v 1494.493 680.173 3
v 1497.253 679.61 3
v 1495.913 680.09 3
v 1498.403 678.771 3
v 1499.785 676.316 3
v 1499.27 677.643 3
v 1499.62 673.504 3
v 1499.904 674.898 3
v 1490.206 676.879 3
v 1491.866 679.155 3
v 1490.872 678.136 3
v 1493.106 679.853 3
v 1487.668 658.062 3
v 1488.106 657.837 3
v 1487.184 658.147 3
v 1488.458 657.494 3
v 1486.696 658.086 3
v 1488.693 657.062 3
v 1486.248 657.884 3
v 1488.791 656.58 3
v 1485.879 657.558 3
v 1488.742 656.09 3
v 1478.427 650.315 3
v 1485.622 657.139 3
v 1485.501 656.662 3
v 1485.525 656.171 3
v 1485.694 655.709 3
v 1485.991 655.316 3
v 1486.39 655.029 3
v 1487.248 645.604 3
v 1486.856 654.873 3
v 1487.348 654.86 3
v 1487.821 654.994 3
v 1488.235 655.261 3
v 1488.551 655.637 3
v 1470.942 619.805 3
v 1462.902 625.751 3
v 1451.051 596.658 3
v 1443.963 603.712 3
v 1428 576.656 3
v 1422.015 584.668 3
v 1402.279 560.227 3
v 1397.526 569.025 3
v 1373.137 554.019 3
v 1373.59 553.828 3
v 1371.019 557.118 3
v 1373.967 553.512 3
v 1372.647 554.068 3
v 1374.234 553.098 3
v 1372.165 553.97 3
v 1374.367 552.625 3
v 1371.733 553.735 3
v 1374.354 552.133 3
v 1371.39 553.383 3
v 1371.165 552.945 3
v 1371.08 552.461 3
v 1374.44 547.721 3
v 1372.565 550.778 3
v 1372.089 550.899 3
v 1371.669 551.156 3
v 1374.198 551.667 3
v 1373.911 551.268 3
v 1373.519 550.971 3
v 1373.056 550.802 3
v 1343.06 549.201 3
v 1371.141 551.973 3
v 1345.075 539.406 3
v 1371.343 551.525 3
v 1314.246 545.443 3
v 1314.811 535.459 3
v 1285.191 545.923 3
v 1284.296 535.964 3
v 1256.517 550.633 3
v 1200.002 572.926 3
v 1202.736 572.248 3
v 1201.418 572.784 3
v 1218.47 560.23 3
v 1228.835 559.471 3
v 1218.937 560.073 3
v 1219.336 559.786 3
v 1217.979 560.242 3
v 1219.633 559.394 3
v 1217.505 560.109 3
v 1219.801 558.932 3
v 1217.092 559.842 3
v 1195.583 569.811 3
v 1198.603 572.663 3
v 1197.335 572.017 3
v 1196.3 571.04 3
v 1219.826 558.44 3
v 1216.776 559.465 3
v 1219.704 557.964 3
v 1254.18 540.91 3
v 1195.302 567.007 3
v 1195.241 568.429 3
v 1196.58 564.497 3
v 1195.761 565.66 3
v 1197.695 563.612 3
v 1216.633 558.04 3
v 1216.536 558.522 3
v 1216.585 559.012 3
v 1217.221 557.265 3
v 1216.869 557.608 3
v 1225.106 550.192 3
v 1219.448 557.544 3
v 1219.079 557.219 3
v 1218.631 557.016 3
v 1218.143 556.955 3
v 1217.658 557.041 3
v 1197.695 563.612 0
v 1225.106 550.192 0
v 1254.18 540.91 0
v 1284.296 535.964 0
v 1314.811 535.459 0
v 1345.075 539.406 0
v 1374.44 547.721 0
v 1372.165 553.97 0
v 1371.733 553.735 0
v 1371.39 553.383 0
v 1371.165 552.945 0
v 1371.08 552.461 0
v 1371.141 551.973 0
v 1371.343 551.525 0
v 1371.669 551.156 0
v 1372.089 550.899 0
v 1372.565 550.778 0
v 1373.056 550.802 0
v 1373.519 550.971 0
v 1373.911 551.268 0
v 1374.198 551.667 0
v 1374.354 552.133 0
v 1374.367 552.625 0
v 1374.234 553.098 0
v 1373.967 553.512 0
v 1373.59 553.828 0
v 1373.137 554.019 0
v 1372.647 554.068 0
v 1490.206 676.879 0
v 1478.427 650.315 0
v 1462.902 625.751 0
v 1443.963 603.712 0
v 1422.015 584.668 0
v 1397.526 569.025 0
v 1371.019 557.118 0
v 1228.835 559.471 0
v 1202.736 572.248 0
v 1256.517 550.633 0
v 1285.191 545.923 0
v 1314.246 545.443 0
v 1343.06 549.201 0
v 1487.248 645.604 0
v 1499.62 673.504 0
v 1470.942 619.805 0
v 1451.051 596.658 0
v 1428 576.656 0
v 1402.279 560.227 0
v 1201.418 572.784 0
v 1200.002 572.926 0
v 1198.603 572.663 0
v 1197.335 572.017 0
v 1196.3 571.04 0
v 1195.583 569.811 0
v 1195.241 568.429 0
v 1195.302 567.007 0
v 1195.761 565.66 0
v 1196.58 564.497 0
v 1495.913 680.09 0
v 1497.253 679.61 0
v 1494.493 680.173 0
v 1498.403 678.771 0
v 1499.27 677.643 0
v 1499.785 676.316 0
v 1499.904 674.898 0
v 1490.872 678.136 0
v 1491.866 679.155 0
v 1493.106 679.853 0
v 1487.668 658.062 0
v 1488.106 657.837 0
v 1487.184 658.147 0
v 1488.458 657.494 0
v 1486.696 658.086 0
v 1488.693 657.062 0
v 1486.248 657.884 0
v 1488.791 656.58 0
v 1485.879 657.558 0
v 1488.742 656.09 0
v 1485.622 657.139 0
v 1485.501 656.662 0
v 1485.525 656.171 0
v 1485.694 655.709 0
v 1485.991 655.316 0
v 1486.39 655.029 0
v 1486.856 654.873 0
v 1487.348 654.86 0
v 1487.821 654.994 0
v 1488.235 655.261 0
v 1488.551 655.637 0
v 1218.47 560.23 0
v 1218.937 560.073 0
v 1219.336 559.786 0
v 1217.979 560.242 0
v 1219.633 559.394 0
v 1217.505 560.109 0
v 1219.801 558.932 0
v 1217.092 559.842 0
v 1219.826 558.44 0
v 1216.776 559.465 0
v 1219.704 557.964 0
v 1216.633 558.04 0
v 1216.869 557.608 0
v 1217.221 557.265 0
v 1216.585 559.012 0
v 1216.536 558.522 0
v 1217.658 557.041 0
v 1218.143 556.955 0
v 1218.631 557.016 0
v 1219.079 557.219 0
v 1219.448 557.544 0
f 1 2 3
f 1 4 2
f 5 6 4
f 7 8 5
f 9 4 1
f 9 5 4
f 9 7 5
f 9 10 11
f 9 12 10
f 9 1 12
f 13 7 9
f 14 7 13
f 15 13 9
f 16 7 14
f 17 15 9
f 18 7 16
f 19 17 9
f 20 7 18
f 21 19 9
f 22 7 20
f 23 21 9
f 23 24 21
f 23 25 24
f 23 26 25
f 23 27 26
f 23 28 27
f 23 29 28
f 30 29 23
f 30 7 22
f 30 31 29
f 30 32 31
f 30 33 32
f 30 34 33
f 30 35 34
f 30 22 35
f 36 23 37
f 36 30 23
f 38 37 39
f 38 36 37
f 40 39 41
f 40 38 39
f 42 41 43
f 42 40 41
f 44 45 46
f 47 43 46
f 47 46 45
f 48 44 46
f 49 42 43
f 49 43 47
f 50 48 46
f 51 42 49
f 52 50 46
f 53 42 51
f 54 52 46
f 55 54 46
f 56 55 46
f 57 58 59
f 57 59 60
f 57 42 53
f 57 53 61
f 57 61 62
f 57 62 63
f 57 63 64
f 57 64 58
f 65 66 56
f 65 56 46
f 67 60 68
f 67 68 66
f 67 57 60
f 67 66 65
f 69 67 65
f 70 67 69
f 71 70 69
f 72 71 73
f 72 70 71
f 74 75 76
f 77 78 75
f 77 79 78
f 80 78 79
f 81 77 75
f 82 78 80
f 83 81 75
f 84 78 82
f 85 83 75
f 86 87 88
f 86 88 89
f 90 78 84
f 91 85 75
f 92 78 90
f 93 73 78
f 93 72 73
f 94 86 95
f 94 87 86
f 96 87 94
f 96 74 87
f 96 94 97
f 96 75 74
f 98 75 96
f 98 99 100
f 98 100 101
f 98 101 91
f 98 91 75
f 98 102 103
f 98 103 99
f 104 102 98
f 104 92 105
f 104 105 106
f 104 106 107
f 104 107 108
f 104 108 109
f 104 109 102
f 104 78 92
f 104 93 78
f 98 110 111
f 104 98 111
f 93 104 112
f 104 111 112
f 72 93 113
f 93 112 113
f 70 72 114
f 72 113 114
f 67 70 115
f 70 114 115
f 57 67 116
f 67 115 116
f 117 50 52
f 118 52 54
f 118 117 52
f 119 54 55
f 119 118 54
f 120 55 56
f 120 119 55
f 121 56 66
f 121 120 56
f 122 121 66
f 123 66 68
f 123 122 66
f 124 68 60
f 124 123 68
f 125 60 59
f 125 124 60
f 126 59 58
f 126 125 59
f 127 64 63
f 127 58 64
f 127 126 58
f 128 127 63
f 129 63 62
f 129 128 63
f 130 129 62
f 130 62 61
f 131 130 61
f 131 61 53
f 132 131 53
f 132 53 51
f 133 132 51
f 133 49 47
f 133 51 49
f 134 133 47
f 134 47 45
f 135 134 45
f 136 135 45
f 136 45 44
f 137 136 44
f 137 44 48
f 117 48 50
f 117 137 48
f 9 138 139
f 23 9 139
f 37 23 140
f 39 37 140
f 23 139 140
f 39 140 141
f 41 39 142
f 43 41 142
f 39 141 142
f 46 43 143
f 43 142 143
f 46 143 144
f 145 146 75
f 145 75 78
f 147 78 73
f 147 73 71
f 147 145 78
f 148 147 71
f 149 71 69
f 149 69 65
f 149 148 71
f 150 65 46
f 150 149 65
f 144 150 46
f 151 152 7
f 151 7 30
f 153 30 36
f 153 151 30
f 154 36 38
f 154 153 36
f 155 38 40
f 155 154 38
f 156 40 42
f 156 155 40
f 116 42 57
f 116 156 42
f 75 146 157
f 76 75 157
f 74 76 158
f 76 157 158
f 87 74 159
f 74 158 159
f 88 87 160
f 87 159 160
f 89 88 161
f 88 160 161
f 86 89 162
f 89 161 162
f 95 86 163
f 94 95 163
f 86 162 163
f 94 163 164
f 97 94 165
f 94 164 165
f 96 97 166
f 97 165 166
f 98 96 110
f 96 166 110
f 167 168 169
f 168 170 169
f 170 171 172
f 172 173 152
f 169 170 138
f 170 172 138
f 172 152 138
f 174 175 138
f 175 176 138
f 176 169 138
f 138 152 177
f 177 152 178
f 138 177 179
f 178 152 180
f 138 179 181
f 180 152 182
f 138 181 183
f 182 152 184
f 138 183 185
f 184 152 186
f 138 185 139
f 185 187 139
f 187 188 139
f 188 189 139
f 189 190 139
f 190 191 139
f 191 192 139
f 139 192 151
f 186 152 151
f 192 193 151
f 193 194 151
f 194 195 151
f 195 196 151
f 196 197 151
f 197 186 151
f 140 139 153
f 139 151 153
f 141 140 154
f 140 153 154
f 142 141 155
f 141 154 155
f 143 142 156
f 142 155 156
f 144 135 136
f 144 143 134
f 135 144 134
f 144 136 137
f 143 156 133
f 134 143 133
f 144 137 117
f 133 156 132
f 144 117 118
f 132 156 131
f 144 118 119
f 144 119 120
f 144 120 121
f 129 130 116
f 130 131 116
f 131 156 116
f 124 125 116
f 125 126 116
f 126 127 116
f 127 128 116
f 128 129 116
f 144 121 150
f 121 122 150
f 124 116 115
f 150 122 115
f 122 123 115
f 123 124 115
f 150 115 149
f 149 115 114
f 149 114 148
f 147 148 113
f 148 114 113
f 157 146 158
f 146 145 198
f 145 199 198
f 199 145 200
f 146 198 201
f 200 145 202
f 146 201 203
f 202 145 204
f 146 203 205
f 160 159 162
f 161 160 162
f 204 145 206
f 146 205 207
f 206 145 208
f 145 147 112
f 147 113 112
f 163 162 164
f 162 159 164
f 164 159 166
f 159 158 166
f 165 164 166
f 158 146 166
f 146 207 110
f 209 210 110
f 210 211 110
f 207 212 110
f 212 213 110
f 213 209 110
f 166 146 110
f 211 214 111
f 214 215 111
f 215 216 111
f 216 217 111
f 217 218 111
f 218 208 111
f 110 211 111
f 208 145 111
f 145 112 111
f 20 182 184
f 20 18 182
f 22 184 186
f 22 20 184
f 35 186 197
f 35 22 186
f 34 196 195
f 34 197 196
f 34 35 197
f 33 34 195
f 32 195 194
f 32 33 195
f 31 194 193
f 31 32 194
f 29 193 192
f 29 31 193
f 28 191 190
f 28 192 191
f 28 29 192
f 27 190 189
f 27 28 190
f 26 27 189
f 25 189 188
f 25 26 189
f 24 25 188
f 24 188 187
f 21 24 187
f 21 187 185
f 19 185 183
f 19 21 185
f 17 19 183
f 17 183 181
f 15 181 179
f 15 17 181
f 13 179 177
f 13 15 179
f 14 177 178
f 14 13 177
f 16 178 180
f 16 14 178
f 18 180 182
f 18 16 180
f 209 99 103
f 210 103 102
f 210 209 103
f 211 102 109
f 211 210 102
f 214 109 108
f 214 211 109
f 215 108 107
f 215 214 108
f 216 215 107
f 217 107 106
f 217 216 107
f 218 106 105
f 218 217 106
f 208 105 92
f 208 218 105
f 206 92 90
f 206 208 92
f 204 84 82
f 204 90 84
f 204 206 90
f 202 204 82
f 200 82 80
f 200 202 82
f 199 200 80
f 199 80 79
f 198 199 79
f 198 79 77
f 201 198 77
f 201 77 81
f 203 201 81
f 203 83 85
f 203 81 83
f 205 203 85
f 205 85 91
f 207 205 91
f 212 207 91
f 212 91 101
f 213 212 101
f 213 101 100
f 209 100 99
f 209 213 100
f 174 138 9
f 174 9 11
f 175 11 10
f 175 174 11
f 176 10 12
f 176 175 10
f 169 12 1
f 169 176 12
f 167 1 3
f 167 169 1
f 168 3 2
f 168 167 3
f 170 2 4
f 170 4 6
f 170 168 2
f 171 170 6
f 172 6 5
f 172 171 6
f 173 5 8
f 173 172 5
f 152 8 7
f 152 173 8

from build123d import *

# Parameters (mm, degrees)
PAD014_DEPTH                        = 3
SKETCH055_R                         = 1.65
POCKET019_DEPTH                     = 364.282338
POCKET019_DEPTH_BACK                = 367.282338
BODY001003005003003_PLACEMENT_ANGLE = 60
CLONE001_PLACEMENT_ANGLE            = 140


with BuildPart() as part:
    # Sketch052 → Pad014 (new body)
    with BuildSketch(Plane.XY):
        with BuildLine():
            ThreePointArc((152.959511, 127.101705), (84.480895, 180.040089), (0, 198.875477))
            Line((0, 198.875477), (0, 208.875477))
            ThreePointArc((160.650731, 133.492724), (88.728824, 189.092995), (0, 208.875477))
            ThreePointArc((152.959511, 127.101705), (160.000631, 126.451604), (160.650731, 133.492724))
        make_face()
    pad014 = extrude(amount=PAD014_DEPTH)

    # Sketch055 → Pocket019 (cut, two sides)
    with BuildSketch(Plane.XY) as pocket019_sk:
        with Locations((143.11, 145.205847)):
            Circle(SKETCH055_R)
        with BuildLine():
            Line((0, 202.225477), (0, 205.525477))
            ThreePointArc((0, 202.225477), (1.65, 203.875477), (0, 205.525477))
        make_face()
    pocket019 = extrude(amount=-POCKET019_DEPTH, mode=Mode.SUBTRACT) + extrude(pocket019_sk.sketch, amount=POCKET019_DEPTH_BACK, mode=Mode.SUBTRACT)

    # Mirrored019: Pad014, Pocket019 across Sketch052 V_Axis
    add(pad014.mirror(Plane(origin=(0, 0, 0), x_dir=(0, 0, 1), z_dir=(1, 0, 0))))
    add(pocket019.mirror(Plane(origin=(0, 0, 0), x_dir=(0, 0, 1), z_dir=(1, 0, 0))), mode=Mode.SUBTRACT)


with BuildPart() as part_1:
    # Body001003005003003 placement: moved
    add(part.part.rotate(Axis((0, 0, 0), (0, 0, 1)), BODY001003005003003_PLACEMENT_ANGLE))


with BuildPart() as part_2:
    # Clone001 placement: moved
    add(part_1.part.moved(Location((1303, 744, 0))).rotate(Axis((1303, 744, 0), (0, 0, 1)), CLONE001_PLACEMENT_ANGLE))


solid = part_2.part
